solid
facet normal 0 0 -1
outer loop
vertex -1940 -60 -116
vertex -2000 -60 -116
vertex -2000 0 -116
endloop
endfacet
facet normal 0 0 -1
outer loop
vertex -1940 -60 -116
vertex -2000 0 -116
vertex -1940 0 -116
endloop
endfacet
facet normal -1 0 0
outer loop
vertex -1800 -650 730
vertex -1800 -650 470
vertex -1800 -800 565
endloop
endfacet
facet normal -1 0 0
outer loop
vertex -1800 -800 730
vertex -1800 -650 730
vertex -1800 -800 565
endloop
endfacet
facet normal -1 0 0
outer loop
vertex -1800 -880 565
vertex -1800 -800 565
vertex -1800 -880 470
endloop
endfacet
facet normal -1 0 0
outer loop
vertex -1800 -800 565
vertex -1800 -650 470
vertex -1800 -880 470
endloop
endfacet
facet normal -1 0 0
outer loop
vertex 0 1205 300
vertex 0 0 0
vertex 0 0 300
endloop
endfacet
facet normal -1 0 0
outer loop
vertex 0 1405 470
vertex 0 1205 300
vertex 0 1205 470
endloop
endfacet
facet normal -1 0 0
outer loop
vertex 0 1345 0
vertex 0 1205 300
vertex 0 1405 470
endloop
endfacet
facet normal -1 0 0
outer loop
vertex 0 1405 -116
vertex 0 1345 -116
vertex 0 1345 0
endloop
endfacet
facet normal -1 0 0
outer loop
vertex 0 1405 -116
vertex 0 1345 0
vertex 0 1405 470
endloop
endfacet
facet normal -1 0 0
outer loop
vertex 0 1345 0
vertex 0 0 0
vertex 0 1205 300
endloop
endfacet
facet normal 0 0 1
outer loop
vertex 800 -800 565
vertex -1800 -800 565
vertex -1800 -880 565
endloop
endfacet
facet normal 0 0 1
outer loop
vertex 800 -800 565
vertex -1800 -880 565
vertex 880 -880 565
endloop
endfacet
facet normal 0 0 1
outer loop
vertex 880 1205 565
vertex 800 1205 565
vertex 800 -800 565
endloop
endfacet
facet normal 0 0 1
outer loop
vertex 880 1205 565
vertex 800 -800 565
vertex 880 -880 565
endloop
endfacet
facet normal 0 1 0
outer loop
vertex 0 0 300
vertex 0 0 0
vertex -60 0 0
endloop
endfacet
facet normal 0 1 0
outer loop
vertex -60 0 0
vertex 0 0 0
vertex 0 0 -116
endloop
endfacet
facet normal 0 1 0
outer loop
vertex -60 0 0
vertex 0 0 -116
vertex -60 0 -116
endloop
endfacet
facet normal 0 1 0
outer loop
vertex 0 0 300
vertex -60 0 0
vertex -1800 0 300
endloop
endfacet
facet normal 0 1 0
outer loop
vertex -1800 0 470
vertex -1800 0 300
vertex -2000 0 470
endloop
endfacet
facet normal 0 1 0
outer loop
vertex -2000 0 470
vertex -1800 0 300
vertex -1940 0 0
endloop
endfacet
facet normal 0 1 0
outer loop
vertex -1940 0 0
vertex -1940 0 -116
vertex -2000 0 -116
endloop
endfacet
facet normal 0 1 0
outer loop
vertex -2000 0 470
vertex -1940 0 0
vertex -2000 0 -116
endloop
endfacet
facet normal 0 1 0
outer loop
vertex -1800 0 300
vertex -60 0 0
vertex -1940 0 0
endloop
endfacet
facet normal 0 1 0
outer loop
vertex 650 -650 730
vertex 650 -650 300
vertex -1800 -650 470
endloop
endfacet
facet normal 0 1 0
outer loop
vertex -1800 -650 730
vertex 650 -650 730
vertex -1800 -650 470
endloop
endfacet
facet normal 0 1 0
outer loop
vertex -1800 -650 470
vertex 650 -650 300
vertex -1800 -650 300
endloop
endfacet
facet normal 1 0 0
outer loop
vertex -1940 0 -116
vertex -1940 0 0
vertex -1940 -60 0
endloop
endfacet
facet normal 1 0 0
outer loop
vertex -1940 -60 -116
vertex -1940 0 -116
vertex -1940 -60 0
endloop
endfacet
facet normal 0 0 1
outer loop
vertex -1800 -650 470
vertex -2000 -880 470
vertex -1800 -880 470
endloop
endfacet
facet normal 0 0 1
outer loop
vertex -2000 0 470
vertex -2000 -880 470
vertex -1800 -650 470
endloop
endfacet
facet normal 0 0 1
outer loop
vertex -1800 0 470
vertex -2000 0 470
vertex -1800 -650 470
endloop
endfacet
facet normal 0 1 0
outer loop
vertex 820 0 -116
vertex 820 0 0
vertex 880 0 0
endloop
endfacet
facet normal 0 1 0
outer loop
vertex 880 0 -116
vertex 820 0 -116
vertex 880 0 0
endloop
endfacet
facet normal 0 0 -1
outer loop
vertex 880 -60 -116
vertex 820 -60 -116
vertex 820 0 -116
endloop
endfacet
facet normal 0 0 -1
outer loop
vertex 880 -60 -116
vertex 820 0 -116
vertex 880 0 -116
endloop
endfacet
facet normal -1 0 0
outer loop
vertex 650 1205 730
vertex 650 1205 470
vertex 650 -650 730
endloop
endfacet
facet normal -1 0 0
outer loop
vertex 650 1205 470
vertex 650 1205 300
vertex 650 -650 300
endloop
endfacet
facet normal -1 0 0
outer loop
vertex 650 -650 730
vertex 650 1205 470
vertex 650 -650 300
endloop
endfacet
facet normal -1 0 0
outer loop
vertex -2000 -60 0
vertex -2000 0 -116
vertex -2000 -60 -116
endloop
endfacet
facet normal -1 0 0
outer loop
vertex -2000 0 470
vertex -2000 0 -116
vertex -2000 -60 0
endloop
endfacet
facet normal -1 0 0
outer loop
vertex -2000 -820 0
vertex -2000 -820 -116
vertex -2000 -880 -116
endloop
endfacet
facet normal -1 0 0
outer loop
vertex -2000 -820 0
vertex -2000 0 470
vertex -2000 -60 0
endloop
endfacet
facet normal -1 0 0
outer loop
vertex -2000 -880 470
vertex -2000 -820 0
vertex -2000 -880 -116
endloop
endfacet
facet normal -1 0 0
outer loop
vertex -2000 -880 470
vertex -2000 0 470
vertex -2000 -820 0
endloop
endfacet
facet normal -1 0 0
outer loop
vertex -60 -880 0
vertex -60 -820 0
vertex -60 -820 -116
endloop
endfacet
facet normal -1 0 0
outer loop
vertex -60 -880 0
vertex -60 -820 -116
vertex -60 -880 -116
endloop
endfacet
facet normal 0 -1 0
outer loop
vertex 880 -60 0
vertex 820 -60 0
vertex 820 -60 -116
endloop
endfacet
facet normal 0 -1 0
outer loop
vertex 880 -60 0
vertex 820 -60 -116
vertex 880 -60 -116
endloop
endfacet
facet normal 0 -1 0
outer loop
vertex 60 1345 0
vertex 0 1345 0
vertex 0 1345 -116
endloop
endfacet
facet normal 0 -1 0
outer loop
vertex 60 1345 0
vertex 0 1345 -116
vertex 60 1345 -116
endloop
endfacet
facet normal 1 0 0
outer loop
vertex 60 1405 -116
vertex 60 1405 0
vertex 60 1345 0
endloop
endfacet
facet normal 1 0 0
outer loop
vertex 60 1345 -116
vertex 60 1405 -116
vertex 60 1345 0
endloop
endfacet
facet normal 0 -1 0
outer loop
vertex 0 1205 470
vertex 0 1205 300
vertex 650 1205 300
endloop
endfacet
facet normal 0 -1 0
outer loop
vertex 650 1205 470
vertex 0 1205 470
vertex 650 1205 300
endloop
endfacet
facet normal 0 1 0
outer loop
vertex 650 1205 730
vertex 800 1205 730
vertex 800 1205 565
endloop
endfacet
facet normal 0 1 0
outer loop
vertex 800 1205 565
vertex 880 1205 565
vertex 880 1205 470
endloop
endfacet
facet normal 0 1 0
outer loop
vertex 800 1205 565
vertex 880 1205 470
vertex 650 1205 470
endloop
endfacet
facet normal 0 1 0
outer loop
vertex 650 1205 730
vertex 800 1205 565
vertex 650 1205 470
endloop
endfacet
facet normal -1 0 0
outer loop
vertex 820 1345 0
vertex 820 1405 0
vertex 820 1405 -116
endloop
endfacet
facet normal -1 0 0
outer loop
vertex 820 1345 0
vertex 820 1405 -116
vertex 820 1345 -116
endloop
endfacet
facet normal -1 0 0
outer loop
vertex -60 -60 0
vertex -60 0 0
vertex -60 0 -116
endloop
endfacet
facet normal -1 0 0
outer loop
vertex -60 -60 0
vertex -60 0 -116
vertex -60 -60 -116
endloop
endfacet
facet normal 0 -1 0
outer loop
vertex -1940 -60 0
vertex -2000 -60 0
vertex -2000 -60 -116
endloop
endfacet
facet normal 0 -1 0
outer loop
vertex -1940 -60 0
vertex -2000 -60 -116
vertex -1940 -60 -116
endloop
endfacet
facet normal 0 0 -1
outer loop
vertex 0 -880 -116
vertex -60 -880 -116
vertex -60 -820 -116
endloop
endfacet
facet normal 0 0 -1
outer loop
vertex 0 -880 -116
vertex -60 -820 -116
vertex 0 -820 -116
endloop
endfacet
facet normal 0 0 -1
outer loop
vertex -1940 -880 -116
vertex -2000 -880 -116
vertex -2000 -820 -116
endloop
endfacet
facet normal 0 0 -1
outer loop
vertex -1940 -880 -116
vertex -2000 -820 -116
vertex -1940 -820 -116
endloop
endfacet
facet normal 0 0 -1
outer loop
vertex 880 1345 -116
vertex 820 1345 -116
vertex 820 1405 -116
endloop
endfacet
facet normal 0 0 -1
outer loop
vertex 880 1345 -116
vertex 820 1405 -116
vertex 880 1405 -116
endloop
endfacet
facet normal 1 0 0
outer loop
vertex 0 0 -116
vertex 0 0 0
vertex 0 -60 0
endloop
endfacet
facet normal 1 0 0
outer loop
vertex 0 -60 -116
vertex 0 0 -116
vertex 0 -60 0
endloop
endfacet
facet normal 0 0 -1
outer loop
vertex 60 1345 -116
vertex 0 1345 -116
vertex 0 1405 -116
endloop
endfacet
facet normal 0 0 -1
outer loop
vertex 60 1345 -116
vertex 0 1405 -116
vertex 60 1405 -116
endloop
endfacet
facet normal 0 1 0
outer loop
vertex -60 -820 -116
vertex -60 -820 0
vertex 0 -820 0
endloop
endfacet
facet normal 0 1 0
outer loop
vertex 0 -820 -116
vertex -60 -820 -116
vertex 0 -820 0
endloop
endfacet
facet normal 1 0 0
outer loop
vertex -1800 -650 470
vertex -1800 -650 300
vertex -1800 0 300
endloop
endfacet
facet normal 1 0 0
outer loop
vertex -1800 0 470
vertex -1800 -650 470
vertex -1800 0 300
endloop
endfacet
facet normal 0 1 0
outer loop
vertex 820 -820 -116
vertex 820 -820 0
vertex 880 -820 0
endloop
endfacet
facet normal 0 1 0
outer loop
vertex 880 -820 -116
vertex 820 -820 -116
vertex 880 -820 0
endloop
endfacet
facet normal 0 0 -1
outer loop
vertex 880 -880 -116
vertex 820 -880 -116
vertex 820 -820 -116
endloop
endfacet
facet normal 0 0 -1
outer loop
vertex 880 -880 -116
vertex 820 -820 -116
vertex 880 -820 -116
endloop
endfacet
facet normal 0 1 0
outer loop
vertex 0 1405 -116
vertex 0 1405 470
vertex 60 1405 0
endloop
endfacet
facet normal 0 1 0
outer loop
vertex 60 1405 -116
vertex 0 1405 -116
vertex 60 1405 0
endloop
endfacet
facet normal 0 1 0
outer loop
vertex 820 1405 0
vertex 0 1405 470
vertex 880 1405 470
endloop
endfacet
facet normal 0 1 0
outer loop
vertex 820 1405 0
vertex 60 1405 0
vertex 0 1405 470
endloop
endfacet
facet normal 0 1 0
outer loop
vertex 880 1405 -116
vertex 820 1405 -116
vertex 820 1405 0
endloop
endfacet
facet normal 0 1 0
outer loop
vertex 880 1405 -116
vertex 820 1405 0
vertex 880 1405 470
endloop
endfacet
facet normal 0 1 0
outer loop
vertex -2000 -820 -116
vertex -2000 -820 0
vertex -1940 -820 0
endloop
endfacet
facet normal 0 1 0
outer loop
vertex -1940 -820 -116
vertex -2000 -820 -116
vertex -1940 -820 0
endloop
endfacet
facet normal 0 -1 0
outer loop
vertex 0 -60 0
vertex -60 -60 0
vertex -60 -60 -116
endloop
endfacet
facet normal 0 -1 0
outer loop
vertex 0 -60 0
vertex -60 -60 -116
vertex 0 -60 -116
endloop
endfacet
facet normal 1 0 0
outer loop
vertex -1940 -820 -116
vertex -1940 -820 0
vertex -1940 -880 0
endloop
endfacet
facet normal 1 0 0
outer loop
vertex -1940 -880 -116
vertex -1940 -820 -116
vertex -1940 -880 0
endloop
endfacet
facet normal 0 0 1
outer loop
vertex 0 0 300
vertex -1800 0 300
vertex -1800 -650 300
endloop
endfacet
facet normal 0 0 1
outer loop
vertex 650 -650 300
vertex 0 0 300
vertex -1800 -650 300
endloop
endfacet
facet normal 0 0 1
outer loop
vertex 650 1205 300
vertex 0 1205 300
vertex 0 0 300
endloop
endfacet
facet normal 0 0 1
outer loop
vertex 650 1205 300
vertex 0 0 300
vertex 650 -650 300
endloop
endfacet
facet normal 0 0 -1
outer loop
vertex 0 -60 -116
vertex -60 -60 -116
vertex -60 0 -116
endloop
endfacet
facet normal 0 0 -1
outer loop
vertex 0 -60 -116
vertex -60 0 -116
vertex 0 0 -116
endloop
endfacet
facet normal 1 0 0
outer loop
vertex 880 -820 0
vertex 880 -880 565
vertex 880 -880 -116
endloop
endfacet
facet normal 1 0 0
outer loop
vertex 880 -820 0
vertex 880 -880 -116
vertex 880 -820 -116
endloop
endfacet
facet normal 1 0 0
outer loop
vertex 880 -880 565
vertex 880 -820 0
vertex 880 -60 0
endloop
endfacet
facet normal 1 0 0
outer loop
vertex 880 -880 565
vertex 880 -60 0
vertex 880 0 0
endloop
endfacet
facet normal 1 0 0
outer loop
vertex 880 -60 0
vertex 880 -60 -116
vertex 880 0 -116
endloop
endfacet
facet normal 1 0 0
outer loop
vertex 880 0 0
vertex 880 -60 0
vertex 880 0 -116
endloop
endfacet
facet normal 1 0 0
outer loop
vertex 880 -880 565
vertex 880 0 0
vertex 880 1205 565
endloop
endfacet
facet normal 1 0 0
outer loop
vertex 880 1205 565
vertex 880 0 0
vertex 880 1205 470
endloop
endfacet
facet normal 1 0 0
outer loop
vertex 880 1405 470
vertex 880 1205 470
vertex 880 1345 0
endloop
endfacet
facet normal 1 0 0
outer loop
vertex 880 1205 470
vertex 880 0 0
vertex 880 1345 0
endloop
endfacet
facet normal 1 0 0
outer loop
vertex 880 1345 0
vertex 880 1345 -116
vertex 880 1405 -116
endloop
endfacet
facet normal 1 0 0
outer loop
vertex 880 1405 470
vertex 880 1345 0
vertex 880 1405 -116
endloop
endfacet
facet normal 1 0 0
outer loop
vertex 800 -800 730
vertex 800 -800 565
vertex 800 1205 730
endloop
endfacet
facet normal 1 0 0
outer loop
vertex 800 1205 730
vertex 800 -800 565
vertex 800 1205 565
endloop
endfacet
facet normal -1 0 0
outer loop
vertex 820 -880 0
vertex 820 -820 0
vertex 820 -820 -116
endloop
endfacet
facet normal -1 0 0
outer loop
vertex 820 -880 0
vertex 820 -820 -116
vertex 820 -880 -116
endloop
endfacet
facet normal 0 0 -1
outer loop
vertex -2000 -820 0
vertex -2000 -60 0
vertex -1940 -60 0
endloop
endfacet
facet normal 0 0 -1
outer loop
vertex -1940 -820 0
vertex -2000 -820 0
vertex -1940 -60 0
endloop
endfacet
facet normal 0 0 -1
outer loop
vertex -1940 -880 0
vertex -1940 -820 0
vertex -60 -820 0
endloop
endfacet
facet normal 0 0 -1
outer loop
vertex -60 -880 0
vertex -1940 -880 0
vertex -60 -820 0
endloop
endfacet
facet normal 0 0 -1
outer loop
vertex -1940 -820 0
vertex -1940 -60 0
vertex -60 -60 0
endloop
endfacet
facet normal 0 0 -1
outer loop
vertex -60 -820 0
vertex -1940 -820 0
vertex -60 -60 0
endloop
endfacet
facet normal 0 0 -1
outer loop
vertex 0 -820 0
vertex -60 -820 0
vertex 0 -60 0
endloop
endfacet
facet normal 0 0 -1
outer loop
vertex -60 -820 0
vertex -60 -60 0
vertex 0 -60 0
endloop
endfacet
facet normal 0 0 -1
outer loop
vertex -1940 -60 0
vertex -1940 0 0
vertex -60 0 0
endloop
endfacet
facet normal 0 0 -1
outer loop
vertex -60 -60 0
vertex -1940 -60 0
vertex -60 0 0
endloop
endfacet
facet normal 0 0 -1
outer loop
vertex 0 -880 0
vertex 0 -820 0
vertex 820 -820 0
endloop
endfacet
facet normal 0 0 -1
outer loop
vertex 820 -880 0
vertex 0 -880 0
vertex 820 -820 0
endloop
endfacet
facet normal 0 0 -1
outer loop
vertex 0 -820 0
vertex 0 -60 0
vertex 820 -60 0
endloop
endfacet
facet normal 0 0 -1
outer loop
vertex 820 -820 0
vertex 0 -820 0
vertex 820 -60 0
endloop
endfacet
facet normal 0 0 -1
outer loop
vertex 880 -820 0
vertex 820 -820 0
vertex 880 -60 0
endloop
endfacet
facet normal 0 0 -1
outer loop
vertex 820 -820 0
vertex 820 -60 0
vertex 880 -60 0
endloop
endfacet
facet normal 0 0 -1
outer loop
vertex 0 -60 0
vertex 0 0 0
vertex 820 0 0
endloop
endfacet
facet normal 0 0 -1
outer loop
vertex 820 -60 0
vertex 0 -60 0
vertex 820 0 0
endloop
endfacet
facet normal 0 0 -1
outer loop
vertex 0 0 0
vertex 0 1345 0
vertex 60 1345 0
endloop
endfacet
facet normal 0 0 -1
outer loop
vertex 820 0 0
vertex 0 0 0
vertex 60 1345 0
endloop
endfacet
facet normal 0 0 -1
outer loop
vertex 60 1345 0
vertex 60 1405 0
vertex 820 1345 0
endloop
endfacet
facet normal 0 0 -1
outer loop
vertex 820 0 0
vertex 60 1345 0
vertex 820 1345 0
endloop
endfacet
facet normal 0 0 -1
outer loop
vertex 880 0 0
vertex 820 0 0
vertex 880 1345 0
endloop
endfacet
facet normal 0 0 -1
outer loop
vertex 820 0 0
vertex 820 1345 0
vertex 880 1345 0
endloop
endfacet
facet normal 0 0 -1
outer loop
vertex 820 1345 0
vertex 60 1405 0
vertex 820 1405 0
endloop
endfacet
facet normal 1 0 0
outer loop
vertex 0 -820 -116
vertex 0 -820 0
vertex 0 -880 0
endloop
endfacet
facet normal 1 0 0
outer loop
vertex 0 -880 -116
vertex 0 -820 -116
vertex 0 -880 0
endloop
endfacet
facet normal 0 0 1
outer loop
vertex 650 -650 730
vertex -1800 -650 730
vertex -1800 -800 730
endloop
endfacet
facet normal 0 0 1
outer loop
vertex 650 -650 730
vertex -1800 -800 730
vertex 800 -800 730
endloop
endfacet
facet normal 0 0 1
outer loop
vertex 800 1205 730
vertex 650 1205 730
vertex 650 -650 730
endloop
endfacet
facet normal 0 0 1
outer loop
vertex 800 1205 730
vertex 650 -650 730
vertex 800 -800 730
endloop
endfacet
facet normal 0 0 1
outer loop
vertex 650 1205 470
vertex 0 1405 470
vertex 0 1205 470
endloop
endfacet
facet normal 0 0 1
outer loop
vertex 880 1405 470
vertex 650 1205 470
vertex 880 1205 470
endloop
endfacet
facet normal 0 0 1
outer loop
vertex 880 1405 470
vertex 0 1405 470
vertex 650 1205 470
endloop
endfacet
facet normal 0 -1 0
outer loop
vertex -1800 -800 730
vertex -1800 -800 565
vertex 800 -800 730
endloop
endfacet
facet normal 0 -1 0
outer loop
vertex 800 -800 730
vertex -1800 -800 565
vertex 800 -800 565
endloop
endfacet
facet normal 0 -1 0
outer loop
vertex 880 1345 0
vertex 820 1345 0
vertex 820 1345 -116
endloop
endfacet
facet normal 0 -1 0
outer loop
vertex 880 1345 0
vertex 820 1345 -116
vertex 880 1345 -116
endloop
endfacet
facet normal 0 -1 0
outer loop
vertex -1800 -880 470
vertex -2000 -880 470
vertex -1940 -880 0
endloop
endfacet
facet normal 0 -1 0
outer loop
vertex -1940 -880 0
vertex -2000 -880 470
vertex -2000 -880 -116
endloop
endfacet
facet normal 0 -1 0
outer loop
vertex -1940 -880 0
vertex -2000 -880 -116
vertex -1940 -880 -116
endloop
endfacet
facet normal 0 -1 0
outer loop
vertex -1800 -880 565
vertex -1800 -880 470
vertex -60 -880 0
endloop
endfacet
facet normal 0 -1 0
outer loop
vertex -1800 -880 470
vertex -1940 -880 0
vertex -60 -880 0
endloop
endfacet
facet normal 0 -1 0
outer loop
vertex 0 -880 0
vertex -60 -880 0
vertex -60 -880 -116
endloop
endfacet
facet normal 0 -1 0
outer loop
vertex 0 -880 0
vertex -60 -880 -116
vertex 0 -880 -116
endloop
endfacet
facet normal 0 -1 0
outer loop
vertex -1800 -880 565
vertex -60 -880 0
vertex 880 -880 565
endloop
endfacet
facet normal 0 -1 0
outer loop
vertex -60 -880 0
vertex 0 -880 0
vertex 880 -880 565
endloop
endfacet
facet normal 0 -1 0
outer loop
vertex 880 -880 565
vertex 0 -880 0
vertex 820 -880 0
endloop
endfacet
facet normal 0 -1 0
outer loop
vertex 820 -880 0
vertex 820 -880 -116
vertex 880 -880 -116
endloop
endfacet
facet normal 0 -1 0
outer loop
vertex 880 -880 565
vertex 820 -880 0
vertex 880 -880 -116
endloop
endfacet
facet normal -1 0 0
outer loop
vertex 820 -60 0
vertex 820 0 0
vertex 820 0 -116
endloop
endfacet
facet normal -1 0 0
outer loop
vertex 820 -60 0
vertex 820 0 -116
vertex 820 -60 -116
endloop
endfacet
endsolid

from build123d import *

# Parameters (mm, degrees)
F1_DEPTH = 300
F2_W     = 60
F2_H     = 60
F3_DEPTH = 116
F4_W     = 880
F4_H     = 200
F4_W_2   = 200
F4_H_2   = 880
F5_DEPTH = 170
F7_DEPTH = 265
F9_DEPTH = 430


with BuildPart() as f1:
    # F0 (on Top) → F1 (new body)
    with BuildSketch(Plane.XY):
        Polygon((0, 1405), (0, 0), (-2000, 0), (-2000, -880), (880, -880), (880, 1405), align=None)
    extrude(amount=F1_DEPTH)

    # F2 (on face) → F3 (join)
    with BuildSketch(Plane(origin=(0, 0, 0), x_dir=(1, 0, 0), z_dir=(0, 0, -1))):
        with Locations((-1970, 850)):
            Rectangle(F2_W, F2_H)
        with Locations((-1970, 30)):
            Rectangle(F2_W, F2_H)
        with Locations((-30, 30)):
            Rectangle(F2_W, F2_H)
        with Locations((-30, 850)):
            Rectangle(F2_W, F2_H)
        with Locations((850, 850)):
            Rectangle(F2_W, F2_H)
        with Locations((850, 30)):
            Rectangle(F2_W, F2_H)
        with Locations((30, -1375)):
            Rectangle(F2_W, F2_H)
        with Locations((850, -1375)):
            Rectangle(F2_W, F2_H)
    extrude(amount=F3_DEPTH)

    # F4 (on face) → F5 (join)
    with BuildSketch(Plane.XY.offset(300)):
        with Locations((440, 1305)):
            Rectangle(F4_W, F4_H)
        with Locations((-1900, -440)):
            Rectangle(F4_W_2, F4_H_2)
    extrude(amount=F5_DEPTH)

    # F6 (on face) → F7 (join)
    with BuildSketch(Plane.XY.offset(300)):
        Polygon((880, -880), (880, 1205), (800, 1205), (800, -800), (-1800, -800), (-1800, -880), (800, -880), align=None)
    extrude(amount=F7_DEPTH)

    # F8 (on face) → F9 (join)
    with BuildSketch(Plane.XY.offset(300)):
        Polygon((650, -800), (800, -800), (800, 1205), (650, 1205), (650, -650), (-1800, -650), (-1800, -800), align=None)
    extrude(amount=F9_DEPTH)


solid = f1.part
